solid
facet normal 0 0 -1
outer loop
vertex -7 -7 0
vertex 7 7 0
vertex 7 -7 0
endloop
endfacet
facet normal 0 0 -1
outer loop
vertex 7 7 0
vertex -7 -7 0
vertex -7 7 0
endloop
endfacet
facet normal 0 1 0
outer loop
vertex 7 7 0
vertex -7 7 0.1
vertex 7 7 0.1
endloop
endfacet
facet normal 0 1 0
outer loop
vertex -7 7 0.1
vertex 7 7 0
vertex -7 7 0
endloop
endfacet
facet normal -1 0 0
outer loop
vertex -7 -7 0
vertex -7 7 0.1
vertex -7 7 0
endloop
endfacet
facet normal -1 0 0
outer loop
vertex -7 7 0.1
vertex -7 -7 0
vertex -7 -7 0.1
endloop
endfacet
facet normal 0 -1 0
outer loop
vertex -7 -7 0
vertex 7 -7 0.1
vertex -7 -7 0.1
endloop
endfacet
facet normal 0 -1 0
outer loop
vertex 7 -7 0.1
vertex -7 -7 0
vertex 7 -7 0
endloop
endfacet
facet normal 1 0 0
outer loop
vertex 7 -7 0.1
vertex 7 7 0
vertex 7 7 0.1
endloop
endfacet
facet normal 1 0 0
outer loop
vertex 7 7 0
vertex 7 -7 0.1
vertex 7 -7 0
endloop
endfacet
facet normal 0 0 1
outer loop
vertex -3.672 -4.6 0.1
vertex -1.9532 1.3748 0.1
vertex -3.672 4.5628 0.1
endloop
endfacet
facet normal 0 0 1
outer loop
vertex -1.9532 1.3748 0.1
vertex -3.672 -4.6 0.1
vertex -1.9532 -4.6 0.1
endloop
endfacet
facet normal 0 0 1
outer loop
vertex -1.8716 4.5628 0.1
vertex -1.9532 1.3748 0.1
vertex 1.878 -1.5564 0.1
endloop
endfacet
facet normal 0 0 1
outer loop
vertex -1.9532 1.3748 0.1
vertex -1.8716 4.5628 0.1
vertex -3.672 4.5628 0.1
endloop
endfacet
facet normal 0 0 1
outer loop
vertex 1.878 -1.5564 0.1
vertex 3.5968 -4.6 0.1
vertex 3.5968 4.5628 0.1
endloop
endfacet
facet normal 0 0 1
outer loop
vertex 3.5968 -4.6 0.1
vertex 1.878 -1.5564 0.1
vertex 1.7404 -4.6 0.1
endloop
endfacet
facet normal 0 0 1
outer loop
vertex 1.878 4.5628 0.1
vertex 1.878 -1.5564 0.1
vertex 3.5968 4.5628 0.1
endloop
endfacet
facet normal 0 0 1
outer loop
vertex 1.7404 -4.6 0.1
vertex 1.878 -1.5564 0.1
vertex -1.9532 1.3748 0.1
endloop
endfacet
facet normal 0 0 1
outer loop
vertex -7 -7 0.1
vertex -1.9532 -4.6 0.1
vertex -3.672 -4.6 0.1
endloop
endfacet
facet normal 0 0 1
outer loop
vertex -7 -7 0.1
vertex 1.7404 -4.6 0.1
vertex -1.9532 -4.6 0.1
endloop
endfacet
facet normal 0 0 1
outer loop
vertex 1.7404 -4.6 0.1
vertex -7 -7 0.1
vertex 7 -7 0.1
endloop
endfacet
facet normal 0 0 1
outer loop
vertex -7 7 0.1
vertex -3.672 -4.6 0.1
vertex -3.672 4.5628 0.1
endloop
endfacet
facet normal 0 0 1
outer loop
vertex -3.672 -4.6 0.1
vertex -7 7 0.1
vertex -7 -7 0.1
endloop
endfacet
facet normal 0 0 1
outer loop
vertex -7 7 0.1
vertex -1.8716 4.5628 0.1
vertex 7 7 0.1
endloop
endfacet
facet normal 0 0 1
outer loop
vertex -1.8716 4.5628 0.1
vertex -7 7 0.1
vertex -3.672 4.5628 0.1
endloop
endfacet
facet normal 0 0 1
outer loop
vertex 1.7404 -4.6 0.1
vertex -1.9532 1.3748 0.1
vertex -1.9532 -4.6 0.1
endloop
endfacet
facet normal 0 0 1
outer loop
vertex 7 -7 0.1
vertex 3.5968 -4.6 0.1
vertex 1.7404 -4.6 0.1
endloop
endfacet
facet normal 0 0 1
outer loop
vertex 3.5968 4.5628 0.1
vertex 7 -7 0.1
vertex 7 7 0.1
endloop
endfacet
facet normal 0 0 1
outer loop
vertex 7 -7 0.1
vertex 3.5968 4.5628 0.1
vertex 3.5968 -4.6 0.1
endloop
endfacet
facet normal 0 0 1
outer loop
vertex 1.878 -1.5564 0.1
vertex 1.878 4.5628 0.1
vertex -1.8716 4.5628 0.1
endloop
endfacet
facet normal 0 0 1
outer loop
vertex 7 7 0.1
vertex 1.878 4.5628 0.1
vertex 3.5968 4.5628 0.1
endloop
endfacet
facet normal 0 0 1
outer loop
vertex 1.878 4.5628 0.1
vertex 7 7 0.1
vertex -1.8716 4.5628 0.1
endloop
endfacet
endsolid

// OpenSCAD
// file: ../p/box5-12.scad
use <../lib.scad>
function ldraw_lib__box5_12() = [
// 0 Box with 5 Faces without Any Edges
// 0 Name: box5-12.dat
// 0 Author: Chris Dee [cwdee]
// 0 !LDRAW_ORG Primitive UPDATE 2009-02
// 0 !LICENSE Licensed under CC BY 4.0 : see CAreadme.txt
// 
// 0 BFC CERTIFY CCW
  [0,"BFC","CERTIFY"],
  [0,"BFC","CCW"],
// 
// 0 !HISTORY 2009-09-03 [PTadmin] Official Update 2009-02
// 
// 
// 4 16 1 1 1 1 1 -1 -1 1 -1 -1 1 1
  [4,16,1,1,1,1,1,-1,-1,1,-1,-1,1,1],
// 4 16 -1 0 1 1 0 1 1 1 1 -1 1 1
  [4,16,-1,0,1,1,0,1,1,1,1,-1,1,1],
// 4 16 -1 0 -1 -1 0 1 -1 1 1 -1 1 -1
  [4,16,-1,0,-1,-1,0,1,-1,1,1,-1,1,-1],
// 4 16 1 0 -1 -1 0 -1 -1 1 -1 1 1 -1
  [4,16,1,0,-1,-1,0,-1,-1,1,-1,1,1,-1],
// 4 16 1 0 1 1 0 -1 1 1 -1 1 1 1
  [4,16,1,0,1,1,0,-1,1,1,-1,1,1,1],
// 0
];
module ldraw_lib__box5_12(step=0, col=false, unit=2/5, alt=false, line=0.2, solid=!$preview)
    makepoly(ldraw_lib__box5_12(), step=step, col=col, unit=unit, alt=alt, line=line, solid=solid);
ldraw_lib__box5_12(line=0.2);
// main file
use <../lib.scad>
use <../p/box5-12.scad>
function ldraw_lib__4521703q() = [
// 0 Sticker  1.7 x  1.7 with Dark_Red "N"
// 0 Name: 4521703q.dat
// 0 Author: J.C. Tchang [tchang]
// 0 !LDRAW_ORG Part UPDATE 2011-01
// 0 !LICENSE Licensed under CC BY 4.0 : see CAreadme.txt
// 
// 0 BFC CERTIFY CCW
  [0,"BFC","CERTIFY"],
  [0,"BFC","CCW"],
// 
// 0 !HISTORY 2011-07-25 [PTadmin] Official Update 2011-01
// 
// 
// 1 15 0 -0.25 0 17.5 0 0 0 0.25 0 0 0 17.5 box5-12.dat
  [1,15,0,-0.25,0,17.5,0,0,0,0.25,0,0,0,17.5, ldraw_lib__box5_12()],
// 0 //
// 4 320 -9.18 -0.25 -11.5 -4.883 -0.25 -11.5 -4.883 -0.25 3.437 -9.18 -0.25 11.407
  [4,320,-9.18,-0.25,-11.5,-4.883,-0.25,-11.5,-4.883,-0.25,3.437,-9.18,-0.25,11.407],
// 4 320 -4.679 -0.25 11.407 -9.18 -0.25 11.407 -4.883 -0.25 3.437 4.695 -0.25 -3.891
  [4,320,-4.679,-0.25,11.407,-9.18,-0.25,11.407,-4.883,-0.25,3.437,4.695,-0.25,-3.891],
// 4 320 4.695 -0.25 -3.891 4.351 -0.25 -11.5 8.992 -0.25 -11.5 8.992 -0.25 11.407
  [4,320,4.695,-0.25,-3.891,4.351,-0.25,-11.5,8.992,-0.25,-11.5,8.992,-0.25,11.407],
// 3 320 4.695 -0.25 11.407 4.695 -0.25 -3.891 8.992 -0.25 11.407
  [3,320,4.695,-0.25,11.407,4.695,-0.25,-3.891,8.992,-0.25,11.407],
// 3 320 4.351 -0.25 -11.5 4.695 -0.25 -3.891 -4.883 -0.25 3.437
  [3,320,4.351,-0.25,-11.5,4.695,-0.25,-3.891,-4.883,-0.25,3.437],
// 0 //
// 3 15 -17.5 -0.25 -17.5 -4.883 -0.25 -11.5 -9.18 -0.25 -11.5
  [3,15,-17.5,-0.25,-17.5,-4.883,-0.25,-11.5,-9.18,-0.25,-11.5],
// 4 15 4.351 -0.25 -11.5 -4.883 -0.25 -11.5 -17.5 -0.25 -17.5 17.5 -0.25 -17.5
  [4,15,4.351,-0.25,-11.5,-4.883,-0.25,-11.5,-17.5,-0.25,-17.5,17.5,-0.25,-17.5],
// 4 15 -17.5 -0.25 17.5 -17.5 -0.25 -17.5 -9.18 -0.25 -11.5 -9.18 -0.25 11.407
  [4,15,-17.5,-0.25,17.5,-17.5,-0.25,-17.5,-9.18,-0.25,-11.5,-9.18,-0.25,11.407],
// 4 15 -17.5 -0.25 17.5 -9.18 -0.25 11.407 -4.679 -0.25 11.407 17.5 -0.25 17.5
  [4,15,-17.5,-0.25,17.5,-9.18,-0.25,11.407,-4.679,-0.25,11.407,17.5,-0.25,17.5],
// 3 15 4.351 -0.25 -11.5 -4.883 -0.25 3.437 -4.883 -0.25 -11.5
  [3,15,4.351,-0.25,-11.5,-4.883,-0.25,3.437,-4.883,-0.25,-11.5],
// 3 15 17.5 -0.25 -17.5 8.992 -0.25 -11.5 4.351 -0.25 -11.5
  [3,15,17.5,-0.25,-17.5,8.992,-0.25,-11.5,4.351,-0.25,-11.5],
// 4 15 8.992 -0.25 -11.5 17.5 -0.25 -17.5 17.5 -0.25 17.5 8.992 -0.25 11.407
  [4,15,8.992,-0.25,-11.5,17.5,-0.25,-17.5,17.5,-0.25,17.5,8.992,-0.25,11.407],
// 3 15 4.695 -0.25 -3.891 4.695 -0.25 11.407 -4.679 -0.25 11.407
  [3,15,4.695,-0.25,-3.891,4.695,-0.25,11.407,-4.679,-0.25,11.407],
// 3 15 17.5 -0.25 17.5 4.695 -0.25 11.407 8.992 -0.25 11.407
  [3,15,17.5,-0.25,17.5,4.695,-0.25,11.407,8.992,-0.25,11.407],
// 3 15 4.695 -0.25 11.407 17.5 -0.25 17.5 -4.679 -0.25 11.407
  [3,15,4.695,-0.25,11.407,17.5,-0.25,17.5,-4.679,-0.25,11.407],
// 0 //
];
module ldraw_lib__4521703q(step=0, col=false, unit=2/5, alt=false, line=0.2, solid=!$preview)
    makepoly(ldraw_lib__4521703q(), step=step, col=col, unit=unit, alt=alt, line=line, solid=solid);
ldraw_lib__4521703q(line=0.2);
